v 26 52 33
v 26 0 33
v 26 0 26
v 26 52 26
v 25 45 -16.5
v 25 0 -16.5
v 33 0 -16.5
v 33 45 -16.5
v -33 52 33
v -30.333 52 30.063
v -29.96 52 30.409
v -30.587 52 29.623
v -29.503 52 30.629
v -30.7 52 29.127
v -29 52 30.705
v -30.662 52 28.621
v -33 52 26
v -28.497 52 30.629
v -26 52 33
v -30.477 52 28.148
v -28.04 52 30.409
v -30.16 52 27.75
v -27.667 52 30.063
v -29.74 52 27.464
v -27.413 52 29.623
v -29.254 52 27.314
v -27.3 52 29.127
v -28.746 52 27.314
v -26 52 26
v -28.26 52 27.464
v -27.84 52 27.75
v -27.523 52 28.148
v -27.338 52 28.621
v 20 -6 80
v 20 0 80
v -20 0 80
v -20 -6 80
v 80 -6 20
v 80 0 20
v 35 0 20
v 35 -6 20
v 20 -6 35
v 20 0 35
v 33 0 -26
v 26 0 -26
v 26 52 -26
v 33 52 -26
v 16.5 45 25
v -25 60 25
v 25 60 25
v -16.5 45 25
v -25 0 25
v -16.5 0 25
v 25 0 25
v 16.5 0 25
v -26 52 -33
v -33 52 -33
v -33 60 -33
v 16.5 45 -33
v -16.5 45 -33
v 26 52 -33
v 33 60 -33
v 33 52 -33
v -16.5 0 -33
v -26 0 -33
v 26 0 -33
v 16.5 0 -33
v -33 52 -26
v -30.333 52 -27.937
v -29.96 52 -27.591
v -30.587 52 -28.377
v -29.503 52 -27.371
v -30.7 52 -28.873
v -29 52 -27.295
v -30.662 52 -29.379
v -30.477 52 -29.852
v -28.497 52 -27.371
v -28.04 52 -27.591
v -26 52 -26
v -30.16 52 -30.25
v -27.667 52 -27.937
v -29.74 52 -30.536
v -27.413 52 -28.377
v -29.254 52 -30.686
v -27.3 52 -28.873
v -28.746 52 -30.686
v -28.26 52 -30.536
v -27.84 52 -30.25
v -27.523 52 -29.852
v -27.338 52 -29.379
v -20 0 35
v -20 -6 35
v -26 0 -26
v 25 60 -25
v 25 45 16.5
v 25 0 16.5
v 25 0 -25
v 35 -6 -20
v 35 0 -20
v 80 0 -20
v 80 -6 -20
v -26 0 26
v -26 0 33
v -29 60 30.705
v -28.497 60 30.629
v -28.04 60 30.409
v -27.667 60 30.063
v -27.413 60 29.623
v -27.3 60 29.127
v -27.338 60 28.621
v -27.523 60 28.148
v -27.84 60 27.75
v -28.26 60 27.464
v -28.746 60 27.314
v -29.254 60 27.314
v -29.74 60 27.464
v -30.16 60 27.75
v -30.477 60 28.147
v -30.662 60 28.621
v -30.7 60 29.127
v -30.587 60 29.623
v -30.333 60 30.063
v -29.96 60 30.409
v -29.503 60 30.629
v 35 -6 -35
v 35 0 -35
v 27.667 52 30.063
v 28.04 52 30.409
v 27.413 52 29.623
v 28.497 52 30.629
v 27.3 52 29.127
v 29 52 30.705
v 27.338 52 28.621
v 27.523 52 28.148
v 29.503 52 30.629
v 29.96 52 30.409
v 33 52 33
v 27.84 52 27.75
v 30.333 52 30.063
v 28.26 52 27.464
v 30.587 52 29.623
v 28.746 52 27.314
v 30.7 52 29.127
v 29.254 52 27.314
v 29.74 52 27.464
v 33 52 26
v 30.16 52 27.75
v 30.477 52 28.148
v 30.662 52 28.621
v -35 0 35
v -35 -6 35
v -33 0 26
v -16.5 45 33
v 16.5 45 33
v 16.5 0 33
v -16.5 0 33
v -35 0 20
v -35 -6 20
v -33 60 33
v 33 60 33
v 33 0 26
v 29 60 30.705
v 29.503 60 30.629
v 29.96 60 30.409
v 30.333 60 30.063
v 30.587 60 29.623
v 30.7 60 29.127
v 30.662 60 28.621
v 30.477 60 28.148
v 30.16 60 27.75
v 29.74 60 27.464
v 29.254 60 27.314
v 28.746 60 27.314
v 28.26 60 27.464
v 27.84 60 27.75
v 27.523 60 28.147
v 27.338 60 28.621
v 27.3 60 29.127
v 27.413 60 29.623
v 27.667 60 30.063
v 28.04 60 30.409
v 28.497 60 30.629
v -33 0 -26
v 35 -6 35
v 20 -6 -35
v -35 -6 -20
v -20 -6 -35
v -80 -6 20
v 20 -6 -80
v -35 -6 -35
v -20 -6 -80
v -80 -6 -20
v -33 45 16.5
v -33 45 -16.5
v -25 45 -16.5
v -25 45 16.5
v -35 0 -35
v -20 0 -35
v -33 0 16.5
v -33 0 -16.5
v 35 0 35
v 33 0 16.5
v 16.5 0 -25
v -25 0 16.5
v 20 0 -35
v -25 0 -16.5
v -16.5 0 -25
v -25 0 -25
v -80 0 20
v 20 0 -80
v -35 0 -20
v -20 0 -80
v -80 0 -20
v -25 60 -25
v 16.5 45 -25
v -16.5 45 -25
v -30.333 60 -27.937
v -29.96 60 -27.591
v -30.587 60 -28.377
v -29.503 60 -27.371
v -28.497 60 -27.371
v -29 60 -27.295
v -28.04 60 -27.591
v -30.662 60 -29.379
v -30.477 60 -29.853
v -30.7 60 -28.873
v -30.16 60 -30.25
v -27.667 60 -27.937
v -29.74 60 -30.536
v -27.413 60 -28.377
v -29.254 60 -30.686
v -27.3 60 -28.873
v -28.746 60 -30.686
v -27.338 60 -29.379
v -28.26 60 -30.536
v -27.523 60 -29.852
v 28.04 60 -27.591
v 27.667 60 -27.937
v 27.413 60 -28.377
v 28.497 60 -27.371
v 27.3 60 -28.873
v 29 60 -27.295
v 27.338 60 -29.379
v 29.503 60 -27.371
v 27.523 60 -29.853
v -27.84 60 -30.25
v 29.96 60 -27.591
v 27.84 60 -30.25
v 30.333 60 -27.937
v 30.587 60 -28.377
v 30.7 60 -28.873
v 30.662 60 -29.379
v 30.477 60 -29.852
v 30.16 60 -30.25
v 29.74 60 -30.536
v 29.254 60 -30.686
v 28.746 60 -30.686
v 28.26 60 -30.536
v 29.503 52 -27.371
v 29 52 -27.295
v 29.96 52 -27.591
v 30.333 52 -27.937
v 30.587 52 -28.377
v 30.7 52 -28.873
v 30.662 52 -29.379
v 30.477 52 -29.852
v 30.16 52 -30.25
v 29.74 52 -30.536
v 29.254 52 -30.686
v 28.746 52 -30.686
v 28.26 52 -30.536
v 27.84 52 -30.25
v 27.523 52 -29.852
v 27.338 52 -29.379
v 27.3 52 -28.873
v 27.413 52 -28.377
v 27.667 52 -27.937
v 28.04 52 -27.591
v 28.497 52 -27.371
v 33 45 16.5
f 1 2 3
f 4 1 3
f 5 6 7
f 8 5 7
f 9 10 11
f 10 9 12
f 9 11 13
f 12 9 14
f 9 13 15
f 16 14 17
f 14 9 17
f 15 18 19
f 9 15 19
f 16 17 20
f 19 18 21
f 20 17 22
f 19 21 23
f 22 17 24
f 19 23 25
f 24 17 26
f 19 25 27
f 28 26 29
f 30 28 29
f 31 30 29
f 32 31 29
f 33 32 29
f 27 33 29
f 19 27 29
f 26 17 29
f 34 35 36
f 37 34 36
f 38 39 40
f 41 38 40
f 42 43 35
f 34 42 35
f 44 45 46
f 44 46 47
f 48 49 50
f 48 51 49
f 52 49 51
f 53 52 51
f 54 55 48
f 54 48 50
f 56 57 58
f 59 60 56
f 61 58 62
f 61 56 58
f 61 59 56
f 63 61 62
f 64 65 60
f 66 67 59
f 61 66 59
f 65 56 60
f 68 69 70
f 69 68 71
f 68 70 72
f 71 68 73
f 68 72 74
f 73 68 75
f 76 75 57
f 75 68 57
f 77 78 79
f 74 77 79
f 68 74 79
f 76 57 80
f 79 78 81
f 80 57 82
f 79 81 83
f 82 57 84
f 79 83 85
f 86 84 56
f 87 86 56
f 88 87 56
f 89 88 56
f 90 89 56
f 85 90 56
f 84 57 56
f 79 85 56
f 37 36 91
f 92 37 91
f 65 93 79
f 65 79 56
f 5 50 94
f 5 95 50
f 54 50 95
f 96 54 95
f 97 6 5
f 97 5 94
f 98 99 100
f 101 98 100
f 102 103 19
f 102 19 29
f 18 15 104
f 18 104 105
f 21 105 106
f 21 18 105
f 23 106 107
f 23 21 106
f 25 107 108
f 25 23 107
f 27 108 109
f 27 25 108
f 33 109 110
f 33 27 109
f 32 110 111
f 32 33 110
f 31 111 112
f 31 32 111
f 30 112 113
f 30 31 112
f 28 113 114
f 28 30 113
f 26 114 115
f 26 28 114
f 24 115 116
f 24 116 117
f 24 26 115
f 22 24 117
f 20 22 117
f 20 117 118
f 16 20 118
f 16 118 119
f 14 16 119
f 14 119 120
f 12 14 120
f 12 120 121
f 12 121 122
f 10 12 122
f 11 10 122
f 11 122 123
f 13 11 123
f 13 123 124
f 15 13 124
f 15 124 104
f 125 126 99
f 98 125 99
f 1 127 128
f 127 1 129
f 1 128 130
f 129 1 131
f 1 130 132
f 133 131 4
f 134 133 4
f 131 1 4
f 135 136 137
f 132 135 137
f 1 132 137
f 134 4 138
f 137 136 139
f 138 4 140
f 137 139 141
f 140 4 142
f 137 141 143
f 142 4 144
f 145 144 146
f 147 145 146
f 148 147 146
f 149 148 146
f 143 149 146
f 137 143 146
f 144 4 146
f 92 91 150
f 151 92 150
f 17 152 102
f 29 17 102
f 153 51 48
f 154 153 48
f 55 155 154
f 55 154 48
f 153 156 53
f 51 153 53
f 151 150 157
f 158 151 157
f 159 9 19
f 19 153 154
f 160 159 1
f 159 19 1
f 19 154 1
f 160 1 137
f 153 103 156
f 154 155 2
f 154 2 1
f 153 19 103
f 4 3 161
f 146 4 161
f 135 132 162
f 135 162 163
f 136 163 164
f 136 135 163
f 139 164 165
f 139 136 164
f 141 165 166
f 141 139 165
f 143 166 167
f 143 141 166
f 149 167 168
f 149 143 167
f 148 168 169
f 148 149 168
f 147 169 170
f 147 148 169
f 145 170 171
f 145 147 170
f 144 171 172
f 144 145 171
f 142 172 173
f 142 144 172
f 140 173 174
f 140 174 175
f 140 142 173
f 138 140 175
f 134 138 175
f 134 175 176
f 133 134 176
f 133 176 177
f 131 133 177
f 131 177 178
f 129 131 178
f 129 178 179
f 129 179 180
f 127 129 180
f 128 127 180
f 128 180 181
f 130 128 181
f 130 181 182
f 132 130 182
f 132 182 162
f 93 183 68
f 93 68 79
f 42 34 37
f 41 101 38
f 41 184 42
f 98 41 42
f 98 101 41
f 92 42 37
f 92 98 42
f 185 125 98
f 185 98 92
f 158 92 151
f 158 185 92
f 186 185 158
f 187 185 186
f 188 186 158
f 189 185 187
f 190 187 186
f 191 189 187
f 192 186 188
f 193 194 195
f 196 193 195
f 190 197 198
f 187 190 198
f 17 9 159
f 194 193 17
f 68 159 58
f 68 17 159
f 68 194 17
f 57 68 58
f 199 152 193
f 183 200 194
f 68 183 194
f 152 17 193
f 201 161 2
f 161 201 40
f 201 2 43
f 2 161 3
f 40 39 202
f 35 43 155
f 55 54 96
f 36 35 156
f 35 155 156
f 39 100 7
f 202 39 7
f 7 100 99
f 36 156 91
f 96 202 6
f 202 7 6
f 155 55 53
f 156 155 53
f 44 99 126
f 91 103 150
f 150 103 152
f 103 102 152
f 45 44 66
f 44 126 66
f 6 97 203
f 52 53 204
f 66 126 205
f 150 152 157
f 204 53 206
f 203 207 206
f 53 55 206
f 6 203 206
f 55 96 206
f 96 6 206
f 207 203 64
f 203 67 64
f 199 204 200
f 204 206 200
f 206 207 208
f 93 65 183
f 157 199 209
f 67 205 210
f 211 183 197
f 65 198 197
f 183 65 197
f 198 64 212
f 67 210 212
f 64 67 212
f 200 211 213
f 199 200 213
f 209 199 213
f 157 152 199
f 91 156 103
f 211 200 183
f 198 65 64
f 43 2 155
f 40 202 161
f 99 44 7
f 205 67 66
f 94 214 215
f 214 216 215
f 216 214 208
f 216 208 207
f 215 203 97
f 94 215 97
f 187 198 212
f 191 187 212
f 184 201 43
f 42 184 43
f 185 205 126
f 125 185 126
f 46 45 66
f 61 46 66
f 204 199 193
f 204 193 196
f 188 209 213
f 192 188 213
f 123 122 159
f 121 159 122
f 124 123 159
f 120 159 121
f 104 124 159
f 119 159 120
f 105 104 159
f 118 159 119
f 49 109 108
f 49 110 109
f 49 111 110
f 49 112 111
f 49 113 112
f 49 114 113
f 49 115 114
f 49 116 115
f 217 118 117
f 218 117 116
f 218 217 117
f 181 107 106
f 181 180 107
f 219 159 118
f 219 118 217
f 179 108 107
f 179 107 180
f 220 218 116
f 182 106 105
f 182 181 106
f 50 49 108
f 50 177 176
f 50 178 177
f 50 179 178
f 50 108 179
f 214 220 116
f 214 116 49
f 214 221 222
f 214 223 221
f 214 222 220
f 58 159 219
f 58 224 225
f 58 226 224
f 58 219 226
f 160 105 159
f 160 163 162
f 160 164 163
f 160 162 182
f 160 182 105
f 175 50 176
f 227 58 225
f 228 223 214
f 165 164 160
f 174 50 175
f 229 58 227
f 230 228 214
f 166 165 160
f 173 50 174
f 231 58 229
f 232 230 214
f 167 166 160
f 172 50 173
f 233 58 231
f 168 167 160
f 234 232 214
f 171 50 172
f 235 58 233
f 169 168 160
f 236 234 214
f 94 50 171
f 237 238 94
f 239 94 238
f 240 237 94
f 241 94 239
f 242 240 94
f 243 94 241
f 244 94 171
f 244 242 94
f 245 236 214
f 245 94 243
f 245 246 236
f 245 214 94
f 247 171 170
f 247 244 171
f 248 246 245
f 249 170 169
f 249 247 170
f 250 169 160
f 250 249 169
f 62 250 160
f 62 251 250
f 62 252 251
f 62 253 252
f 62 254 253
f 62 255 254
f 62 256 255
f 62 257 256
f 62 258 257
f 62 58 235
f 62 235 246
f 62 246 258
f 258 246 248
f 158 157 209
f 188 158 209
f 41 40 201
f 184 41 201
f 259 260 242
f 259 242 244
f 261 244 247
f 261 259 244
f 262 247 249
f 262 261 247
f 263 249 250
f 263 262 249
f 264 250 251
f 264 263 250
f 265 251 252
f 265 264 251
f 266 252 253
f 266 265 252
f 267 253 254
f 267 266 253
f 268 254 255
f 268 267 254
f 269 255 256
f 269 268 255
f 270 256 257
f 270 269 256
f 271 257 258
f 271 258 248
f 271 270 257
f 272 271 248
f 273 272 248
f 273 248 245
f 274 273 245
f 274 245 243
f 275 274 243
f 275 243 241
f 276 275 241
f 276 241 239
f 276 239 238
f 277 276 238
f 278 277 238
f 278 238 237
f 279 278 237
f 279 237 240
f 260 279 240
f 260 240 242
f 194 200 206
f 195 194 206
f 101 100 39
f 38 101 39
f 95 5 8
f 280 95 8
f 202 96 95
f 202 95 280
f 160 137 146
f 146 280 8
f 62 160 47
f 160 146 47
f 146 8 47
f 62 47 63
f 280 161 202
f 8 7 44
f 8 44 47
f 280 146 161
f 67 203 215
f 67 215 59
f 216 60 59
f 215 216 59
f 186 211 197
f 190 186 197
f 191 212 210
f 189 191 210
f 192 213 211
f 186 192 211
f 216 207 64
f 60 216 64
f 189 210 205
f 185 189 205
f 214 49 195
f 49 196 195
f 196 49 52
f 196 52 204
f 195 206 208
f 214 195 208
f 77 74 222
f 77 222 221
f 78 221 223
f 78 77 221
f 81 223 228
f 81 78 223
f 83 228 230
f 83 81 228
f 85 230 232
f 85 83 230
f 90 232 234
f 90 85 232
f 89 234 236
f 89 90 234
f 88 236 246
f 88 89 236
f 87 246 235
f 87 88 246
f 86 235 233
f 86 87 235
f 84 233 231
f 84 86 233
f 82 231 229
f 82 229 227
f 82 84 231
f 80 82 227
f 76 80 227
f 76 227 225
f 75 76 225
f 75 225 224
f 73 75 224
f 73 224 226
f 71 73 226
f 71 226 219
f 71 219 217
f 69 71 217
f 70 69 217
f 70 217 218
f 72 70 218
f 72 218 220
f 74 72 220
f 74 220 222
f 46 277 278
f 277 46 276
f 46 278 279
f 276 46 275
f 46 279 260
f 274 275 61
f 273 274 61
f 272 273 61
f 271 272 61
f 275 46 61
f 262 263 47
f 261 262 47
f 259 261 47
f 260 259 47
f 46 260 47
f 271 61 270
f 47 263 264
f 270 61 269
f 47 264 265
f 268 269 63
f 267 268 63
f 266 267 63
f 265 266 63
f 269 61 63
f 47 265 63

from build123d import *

# Parameters (mm, degrees)
BOSS_EXTRUDE1_DEPTH = 6
SKETCH2_W           = 66
SKETCH2_H           = 66
SKETCH2_R           = 1.705
SKETCH2_W_2         = 50
SKETCH2_H_2         = 50
BOSS_EXTRUDE2_DEPTH = 60
SKETCH4_W           = 7
SKETCH4_H           = 7
CUT_EXTRUDE2_DEPTH  = 52
SKETCH5_W           = 33
SKETCH5_H           = 8
SKETCH5_W_2         = 8
SKETCH5_H_2         = 33
CUT_EXTRUDE3_DEPTH  = 45


with BuildPart() as part:
    # Sketch1 → Boss-Extrude1 (new body)
    with BuildSketch(Plane(origin=(0, 0, 0), x_dir=(1, 0, 0), z_dir=(0, 1, 0))):
        Polygon((-20, 80), (20, 80), (20, 35), (35, 35), (35, 20), (80, 20), (80, -20), (35, -20), (35, -35), (20, -35), (20, -80), (-20, -80), (-20, -35), (-35, -35), (-35, -20), (-80, -20), (-80, 20), (-35, 20), (-35, 35), (-20, 35), align=None)
    extrude(amount=-BOSS_EXTRUDE1_DEPTH)

    # Sketch2 → Boss-Extrude2 (add)
    with BuildSketch(Plane(origin=(0, 0, 0), x_dir=(1, 0, 0), z_dir=(0, 1, 0))):
        Rectangle(SKETCH2_W, SKETCH2_H)
        with Locations(Location((29, 29, 0), (0, 0, 270))):
            Circle(SKETCH2_R, mode=Mode.SUBTRACT)
        with Locations(Location((-29, 29, 0), (0, 0, 270))):
            Circle(SKETCH2_R, mode=Mode.SUBTRACT)
        with Locations(Location((29, -29, 0), (0, 0, 270))):
            Circle(SKETCH2_R, mode=Mode.SUBTRACT)
        with Locations(Location((-29, -29, 0), (0, 0, 270))):
            Circle(SKETCH2_R, mode=Mode.SUBTRACT)
        Rectangle(SKETCH2_W_2, SKETCH2_H_2, mode=Mode.SUBTRACT)
    extrude(amount=BOSS_EXTRUDE2_DEPTH)

    # Sketch4 → Cut-Extrude2 (cut)
    with BuildSketch(Plane(origin=(0, 0, 0), x_dir=(1, 0, 0), z_dir=(0, 1, 0))):
        with Locations((-29.5, 29.5)):
            Rectangle(SKETCH4_W, SKETCH4_H)
        with Locations((29.5, 29.5)):
            Rectangle(SKETCH4_W, SKETCH4_H)
        with Locations((29.5, -29.5)):
            Rectangle(SKETCH4_W, SKETCH4_H)
        with Locations((-29.5, -29.5)):
            Rectangle(SKETCH4_W, SKETCH4_H)
    extrude(amount=CUT_EXTRUDE2_DEPTH, mode=Mode.SUBTRACT)

    # Sketch5 → Cut-Extrude3 (cut)
    with BuildSketch(Plane(origin=(0, 0, 0), x_dir=(1, 0, 0), z_dir=(0, 1, 0))):
        with Locations((0, 29)):
            Rectangle(SKETCH5_W, SKETCH5_H)
        with Locations((0, -29)):
            Rectangle(SKETCH5_W, SKETCH5_H)
        with Locations((29, 0)):
            Rectangle(SKETCH5_W_2, SKETCH5_H_2)
        with Locations((-29, 0)):
            Rectangle(SKETCH5_W_2, SKETCH5_H_2)
    extrude(amount=CUT_EXTRUDE3_DEPTH, mode=Mode.SUBTRACT)


solid = part.part
